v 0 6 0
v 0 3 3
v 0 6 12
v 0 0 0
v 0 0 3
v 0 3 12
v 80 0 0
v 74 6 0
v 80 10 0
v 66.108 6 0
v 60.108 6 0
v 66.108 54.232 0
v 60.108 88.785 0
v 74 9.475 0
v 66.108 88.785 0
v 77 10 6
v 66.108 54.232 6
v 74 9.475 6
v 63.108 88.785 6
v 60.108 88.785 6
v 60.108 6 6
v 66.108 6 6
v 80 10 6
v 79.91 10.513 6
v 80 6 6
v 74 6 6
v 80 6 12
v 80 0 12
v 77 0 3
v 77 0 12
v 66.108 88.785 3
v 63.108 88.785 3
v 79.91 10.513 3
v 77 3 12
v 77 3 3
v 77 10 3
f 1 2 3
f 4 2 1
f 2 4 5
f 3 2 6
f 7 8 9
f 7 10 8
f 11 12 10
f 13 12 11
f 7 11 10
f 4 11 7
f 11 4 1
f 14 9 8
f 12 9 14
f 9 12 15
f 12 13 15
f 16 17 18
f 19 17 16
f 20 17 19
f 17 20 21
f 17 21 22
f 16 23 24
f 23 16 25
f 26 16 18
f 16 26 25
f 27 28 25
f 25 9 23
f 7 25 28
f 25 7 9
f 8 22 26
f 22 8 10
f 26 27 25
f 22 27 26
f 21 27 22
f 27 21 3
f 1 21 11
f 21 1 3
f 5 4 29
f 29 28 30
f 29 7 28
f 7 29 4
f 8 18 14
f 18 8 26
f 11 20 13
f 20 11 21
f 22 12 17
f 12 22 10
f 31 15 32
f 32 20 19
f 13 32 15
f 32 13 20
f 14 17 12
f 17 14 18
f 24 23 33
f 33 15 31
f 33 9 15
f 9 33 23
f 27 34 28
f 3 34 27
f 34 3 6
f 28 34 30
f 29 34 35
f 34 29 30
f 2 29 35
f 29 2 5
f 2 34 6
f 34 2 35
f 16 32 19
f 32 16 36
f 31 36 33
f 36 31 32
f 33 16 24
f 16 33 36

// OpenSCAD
// file: pistation.scad
/*--------------------------------------------------------------------------*
* Defines all the sizes we need. This file is used by all other SCADs
*--------------------------------------------------------------------------*/

// Define the dimensions of the things we need to place
LCD_OUTER_WIDTH  = 105;
LCD_OUTER_HEIGHT = 68;
LCD_OUTER_DEPTH  = 3;

LCD_INNER_WIDTH  = 98;
LCD_INNER_HEIGHT = 57;
LCD_INNER_DEPTH  = 1;

LCD_UPPER_SPACE = 3;
LCD_LOWER_SPACE = 8;
LCD_LEFT_SPACE  = 3.5;
LCD_RIGHT_SPACE = 3.5;

BUTTON_DIAMETER = 10;
BUTTON_DEPTH    = 7;
BUTTON_SPACE    = 3;

GENERAL_SPACE   = 6;

FRAME_WIDTH = 80;
FRAME_STEP  = 10;

FRONT_ANGLE = 10;

MDF_SIZE = 3;

// Now calculate the extra sizes
BLOCK_WIDTH  = GENERAL_SPACE + LCD_OUTER_WIDTH + GENERAL_SPACE + BUTTON_DIAMETER + GENERAL_SPACE;
BLOCK_HEIGHT = GENERAL_SPACE + LCD_OUTER_HEIGHT + GENERAL_SPACE;
BLOCK_DEPTH  = LCD_OUTER_DEPTH + LCD_INNER_DEPTH;

TOTAL_BUTTON_HEIGHT = 4 * (BUTTON_DIAMETER + BUTTON_SPACE);
TOTAL_BUTTON_WIDTH  = BUTTON_DIAMETER;

PANEL_SIDE_WIDTH  = BLOCK_HEIGHT * sin(FRONT_ANGLE);
PANEL_SIDE_HEIGHT = BLOCK_HEIGHT * cos(FRONT_ANGLE);

FRAME_HEIGHT = FRAME_STEP + PANEL_SIDE_HEIGHT;

/** Create a frame
 *
 * This creates the left frame (without any cutouts). It is used as the basis
 * for the left and right frame SCAD files.
 */
module frame() {
  // Let's make the frame components
  cube(size = [ FRAME_WIDTH, GENERAL_SPACE, GENERAL_SPACE ], center = false);
  cube(size = [ GENERAL_SPACE, FRAME_STEP, GENERAL_SPACE ], center = false);
  translate(v = [ PANEL_SIDE_WIDTH, 0, 0 ]) {
    cube(size = [ GENERAL_SPACE, FRAME_HEIGHT, GENERAL_SPACE ], center = false);
    }
  translate(v = [ 0, FRAME_STEP, 0 ]) {
    rotate(a = [ 0, 0, -FRONT_ANGLE ]) {
      cube(size = [ GENERAL_SPACE, BLOCK_HEIGHT, GENERAL_SPACE ], center = false);
      }
    }
  }
// main file
/*--------------------------------------------------------------------------*
* Describes the left hand side frame for the PiStation.
*--------------------------------------------------------------------------*/
include <pistation.scad>

// Create a frame and add cutouts for mounting
difference() {
  union() {
    translate(v = [ FRAME_WIDTH, 0, GENERAL_SPACE ]) {
      rotate(a = [ 0, 180, 0 ]) {
        frame();
        }
      }
    cube(size = [ FRAME_WIDTH, GENERAL_SPACE, GENERAL_SPACE * 2], center = false);
    }
  translate(v = [ -MDF_SIZE, 0, GENERAL_SPACE - MDF_SIZE ]) {
    cube(size = [ FRAME_WIDTH, MDF_SIZE, 3 * GENERAL_SPACE ], center = false);
    }
  translate(v = [ FRAME_WIDTH - MDF_SIZE, FRAME_STEP, GENERAL_SPACE - MDF_SIZE ]) {
    rotate(a = [ 0, 0, FRONT_ANGLE ]) {
      cube(size = [ MDF_SIZE, BLOCK_HEIGHT + GENERAL_SPACE, GENERAL_SPACE ], center = false);
      }
    }
  }  

//cube(size = [ FRAME_WIDTH, FRAME_HEIGHT, GENERAL_SPACE ], center = false);
